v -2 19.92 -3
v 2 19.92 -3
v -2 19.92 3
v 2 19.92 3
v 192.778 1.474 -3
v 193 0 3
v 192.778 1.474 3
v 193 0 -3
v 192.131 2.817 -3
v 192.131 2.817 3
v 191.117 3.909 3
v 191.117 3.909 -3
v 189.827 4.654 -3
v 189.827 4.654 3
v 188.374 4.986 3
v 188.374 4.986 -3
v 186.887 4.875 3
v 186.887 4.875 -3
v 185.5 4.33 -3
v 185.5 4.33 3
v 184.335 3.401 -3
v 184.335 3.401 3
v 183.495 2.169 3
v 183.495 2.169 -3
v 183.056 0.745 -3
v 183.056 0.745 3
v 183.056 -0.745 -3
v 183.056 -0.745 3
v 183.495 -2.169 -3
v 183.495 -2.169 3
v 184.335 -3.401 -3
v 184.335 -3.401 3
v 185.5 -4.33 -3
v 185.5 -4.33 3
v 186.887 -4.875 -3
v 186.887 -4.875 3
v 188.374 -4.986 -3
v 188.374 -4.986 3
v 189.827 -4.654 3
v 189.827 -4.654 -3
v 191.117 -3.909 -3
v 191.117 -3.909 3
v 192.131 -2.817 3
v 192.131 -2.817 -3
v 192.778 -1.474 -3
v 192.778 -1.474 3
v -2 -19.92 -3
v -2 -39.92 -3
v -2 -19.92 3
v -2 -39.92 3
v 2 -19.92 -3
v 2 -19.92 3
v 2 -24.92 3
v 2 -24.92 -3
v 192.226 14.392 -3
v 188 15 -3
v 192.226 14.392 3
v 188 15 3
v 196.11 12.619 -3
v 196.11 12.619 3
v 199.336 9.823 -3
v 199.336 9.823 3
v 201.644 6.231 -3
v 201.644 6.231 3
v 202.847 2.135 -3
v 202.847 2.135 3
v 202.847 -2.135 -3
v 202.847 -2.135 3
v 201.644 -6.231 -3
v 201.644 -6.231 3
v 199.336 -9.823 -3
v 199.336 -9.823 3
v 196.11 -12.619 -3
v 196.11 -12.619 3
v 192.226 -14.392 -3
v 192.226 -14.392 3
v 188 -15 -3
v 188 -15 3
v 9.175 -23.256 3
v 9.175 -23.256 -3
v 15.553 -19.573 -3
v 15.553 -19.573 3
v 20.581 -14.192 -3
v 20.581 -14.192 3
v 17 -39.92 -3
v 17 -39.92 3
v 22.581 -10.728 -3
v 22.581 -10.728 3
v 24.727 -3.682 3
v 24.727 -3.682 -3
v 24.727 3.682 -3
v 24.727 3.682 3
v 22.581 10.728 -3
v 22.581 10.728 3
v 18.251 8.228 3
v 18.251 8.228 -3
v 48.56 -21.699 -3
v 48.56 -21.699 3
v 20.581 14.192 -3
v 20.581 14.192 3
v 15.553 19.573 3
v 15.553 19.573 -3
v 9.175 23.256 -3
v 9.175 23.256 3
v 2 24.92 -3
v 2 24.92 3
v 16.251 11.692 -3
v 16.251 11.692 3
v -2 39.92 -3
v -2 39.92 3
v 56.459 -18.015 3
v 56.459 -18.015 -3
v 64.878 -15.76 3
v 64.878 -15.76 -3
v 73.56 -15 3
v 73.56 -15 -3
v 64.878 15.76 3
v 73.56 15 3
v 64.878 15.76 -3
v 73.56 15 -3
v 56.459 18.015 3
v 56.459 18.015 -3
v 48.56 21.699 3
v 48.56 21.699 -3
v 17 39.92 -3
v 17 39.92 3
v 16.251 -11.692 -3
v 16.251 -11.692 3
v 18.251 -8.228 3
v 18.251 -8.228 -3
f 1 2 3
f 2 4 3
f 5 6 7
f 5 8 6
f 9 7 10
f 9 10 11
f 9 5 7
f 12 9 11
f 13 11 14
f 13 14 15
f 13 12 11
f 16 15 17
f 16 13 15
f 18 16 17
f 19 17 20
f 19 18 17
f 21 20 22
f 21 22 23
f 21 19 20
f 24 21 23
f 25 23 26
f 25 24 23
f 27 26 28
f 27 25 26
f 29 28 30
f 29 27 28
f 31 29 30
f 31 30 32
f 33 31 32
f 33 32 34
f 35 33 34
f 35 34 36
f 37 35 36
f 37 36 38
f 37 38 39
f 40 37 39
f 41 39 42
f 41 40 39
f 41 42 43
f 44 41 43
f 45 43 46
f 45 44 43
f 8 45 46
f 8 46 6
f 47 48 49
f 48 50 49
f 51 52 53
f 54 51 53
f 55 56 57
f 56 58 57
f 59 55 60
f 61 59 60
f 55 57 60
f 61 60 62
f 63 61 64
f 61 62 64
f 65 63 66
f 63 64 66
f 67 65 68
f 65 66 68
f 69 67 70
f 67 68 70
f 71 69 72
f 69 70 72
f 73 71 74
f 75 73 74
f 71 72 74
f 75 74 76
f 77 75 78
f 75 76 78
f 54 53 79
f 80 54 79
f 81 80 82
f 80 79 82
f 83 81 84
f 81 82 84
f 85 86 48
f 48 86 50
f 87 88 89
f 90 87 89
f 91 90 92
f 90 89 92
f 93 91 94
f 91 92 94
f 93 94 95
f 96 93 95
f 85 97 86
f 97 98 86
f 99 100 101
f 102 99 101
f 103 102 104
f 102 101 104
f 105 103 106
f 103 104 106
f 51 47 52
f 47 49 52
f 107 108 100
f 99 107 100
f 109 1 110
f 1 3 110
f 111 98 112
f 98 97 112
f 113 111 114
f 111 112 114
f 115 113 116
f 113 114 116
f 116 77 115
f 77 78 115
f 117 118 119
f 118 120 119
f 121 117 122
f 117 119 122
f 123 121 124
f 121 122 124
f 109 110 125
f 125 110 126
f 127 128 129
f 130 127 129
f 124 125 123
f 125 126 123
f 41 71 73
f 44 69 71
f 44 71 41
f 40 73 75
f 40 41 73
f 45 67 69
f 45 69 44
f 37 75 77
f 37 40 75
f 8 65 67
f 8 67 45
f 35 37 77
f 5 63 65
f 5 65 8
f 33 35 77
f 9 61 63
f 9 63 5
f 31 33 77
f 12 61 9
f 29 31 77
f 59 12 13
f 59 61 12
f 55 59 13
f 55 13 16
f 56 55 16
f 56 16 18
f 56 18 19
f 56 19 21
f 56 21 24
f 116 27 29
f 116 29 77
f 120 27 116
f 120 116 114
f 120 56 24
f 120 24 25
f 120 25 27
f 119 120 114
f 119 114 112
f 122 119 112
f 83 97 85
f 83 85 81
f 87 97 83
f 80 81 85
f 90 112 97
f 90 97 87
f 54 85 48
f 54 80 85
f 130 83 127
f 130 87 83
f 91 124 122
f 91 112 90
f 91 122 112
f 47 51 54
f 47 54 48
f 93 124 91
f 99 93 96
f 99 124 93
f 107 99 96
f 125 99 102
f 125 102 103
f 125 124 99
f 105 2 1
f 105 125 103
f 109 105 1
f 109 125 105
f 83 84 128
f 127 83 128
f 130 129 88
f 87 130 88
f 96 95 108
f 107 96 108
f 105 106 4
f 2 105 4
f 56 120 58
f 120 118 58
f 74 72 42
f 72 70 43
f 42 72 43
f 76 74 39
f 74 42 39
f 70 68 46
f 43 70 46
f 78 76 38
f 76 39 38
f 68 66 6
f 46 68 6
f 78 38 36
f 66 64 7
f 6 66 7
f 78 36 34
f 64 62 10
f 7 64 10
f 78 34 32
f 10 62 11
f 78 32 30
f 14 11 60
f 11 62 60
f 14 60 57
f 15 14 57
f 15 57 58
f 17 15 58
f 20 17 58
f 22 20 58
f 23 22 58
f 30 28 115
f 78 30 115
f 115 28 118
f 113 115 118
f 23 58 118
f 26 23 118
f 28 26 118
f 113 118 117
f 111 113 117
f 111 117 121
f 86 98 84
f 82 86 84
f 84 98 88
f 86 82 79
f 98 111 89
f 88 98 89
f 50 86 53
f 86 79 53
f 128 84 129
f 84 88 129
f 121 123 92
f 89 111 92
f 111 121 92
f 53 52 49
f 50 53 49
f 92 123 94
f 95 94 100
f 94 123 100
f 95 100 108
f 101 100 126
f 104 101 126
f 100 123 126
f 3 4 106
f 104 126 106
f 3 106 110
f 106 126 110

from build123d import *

# Parameters (mm, degrees)
SKETCH1_R           = 5
BOSS_EXTRUDE1_DEPTH = 3
FILLET1_R           = 50


with BuildPart() as part:
    # Sketch1 → Boss-Extrude1 (new, symmetric)
    with BuildSketch(Plane.XY):
        with BuildLine():
            Line((2, 24.919871589), (2, 19.919871589))
            Line((2, 19.919871589), (-2, 19.919871589))
            Line((-2, 19.919871589), (-2, 24.919871589))
            Line((-2, 24.919871589), (-2, 39.919871589))
            Line((-2, 39.919871589), (17, 39.919871589))
            Line((17, 39.919871589), (60.16248371, 15))
            Line((60.16248371, 15), (188, 15))
            ThreePointArc((188, 15), (203, 0), (188, -15))
            Line((188, -15), (60.16248371, -15))
            Line((60.16248371, -15), (17, -39.919871589))
            Line((17, -39.919871589), (-2, -39.919871589))
            Line((-2, -39.919871589), (-2, -24.919871589))
            Line((-2, -24.919871589), (-2, -19.919871589))
            Line((-2, -19.919871589), (2, -19.919871589))
            Line((2, -19.919871589), (2, -24.919871589))
            ThreePointArc((2, -24.919871589), (12.5, -21.650635095), (20.581241855, -14.191986602))
            Line((20.581241855, -14.191986602), (16.251114836, -11.691986602))
            Line((16.251114836, -11.691986602), (18.251114836, -8.227884987))
            Line((18.251114836, -8.227884987), (22.581241855, -10.727884987))
            ThreePointArc((22.581241855, -10.727884987), (25, 0), (22.581241855, 10.727884987))
            Line((22.581241855, 10.727884987), (18.251114836, 8.227884987))
            Line((18.251114836, 8.227884987), (16.251114836, 11.691986602))
            Line((16.251114836, 11.691986602), (20.581241855, 14.191986602))
            ThreePointArc((20.581241855, 14.191986602), (12.5, 21.650635095), (2, 24.919871589))
        make_face()
        with Locations((188, 0)):
            Circle(SKETCH1_R, mode=Mode.SUBTRACT)
    extrude(amount=BOSS_EXTRUDE1_DEPTH, both=True)

    # Fillet1
    fillet1_edges = [part.edges().sort_by_distance(p)[0] for p in [
        (60.16248371, -15, 0),
        (60.16248371, 15, 0),
    ]]
    fillet(fillet1_edges, radius=FILLET1_R)


solid = part.part
